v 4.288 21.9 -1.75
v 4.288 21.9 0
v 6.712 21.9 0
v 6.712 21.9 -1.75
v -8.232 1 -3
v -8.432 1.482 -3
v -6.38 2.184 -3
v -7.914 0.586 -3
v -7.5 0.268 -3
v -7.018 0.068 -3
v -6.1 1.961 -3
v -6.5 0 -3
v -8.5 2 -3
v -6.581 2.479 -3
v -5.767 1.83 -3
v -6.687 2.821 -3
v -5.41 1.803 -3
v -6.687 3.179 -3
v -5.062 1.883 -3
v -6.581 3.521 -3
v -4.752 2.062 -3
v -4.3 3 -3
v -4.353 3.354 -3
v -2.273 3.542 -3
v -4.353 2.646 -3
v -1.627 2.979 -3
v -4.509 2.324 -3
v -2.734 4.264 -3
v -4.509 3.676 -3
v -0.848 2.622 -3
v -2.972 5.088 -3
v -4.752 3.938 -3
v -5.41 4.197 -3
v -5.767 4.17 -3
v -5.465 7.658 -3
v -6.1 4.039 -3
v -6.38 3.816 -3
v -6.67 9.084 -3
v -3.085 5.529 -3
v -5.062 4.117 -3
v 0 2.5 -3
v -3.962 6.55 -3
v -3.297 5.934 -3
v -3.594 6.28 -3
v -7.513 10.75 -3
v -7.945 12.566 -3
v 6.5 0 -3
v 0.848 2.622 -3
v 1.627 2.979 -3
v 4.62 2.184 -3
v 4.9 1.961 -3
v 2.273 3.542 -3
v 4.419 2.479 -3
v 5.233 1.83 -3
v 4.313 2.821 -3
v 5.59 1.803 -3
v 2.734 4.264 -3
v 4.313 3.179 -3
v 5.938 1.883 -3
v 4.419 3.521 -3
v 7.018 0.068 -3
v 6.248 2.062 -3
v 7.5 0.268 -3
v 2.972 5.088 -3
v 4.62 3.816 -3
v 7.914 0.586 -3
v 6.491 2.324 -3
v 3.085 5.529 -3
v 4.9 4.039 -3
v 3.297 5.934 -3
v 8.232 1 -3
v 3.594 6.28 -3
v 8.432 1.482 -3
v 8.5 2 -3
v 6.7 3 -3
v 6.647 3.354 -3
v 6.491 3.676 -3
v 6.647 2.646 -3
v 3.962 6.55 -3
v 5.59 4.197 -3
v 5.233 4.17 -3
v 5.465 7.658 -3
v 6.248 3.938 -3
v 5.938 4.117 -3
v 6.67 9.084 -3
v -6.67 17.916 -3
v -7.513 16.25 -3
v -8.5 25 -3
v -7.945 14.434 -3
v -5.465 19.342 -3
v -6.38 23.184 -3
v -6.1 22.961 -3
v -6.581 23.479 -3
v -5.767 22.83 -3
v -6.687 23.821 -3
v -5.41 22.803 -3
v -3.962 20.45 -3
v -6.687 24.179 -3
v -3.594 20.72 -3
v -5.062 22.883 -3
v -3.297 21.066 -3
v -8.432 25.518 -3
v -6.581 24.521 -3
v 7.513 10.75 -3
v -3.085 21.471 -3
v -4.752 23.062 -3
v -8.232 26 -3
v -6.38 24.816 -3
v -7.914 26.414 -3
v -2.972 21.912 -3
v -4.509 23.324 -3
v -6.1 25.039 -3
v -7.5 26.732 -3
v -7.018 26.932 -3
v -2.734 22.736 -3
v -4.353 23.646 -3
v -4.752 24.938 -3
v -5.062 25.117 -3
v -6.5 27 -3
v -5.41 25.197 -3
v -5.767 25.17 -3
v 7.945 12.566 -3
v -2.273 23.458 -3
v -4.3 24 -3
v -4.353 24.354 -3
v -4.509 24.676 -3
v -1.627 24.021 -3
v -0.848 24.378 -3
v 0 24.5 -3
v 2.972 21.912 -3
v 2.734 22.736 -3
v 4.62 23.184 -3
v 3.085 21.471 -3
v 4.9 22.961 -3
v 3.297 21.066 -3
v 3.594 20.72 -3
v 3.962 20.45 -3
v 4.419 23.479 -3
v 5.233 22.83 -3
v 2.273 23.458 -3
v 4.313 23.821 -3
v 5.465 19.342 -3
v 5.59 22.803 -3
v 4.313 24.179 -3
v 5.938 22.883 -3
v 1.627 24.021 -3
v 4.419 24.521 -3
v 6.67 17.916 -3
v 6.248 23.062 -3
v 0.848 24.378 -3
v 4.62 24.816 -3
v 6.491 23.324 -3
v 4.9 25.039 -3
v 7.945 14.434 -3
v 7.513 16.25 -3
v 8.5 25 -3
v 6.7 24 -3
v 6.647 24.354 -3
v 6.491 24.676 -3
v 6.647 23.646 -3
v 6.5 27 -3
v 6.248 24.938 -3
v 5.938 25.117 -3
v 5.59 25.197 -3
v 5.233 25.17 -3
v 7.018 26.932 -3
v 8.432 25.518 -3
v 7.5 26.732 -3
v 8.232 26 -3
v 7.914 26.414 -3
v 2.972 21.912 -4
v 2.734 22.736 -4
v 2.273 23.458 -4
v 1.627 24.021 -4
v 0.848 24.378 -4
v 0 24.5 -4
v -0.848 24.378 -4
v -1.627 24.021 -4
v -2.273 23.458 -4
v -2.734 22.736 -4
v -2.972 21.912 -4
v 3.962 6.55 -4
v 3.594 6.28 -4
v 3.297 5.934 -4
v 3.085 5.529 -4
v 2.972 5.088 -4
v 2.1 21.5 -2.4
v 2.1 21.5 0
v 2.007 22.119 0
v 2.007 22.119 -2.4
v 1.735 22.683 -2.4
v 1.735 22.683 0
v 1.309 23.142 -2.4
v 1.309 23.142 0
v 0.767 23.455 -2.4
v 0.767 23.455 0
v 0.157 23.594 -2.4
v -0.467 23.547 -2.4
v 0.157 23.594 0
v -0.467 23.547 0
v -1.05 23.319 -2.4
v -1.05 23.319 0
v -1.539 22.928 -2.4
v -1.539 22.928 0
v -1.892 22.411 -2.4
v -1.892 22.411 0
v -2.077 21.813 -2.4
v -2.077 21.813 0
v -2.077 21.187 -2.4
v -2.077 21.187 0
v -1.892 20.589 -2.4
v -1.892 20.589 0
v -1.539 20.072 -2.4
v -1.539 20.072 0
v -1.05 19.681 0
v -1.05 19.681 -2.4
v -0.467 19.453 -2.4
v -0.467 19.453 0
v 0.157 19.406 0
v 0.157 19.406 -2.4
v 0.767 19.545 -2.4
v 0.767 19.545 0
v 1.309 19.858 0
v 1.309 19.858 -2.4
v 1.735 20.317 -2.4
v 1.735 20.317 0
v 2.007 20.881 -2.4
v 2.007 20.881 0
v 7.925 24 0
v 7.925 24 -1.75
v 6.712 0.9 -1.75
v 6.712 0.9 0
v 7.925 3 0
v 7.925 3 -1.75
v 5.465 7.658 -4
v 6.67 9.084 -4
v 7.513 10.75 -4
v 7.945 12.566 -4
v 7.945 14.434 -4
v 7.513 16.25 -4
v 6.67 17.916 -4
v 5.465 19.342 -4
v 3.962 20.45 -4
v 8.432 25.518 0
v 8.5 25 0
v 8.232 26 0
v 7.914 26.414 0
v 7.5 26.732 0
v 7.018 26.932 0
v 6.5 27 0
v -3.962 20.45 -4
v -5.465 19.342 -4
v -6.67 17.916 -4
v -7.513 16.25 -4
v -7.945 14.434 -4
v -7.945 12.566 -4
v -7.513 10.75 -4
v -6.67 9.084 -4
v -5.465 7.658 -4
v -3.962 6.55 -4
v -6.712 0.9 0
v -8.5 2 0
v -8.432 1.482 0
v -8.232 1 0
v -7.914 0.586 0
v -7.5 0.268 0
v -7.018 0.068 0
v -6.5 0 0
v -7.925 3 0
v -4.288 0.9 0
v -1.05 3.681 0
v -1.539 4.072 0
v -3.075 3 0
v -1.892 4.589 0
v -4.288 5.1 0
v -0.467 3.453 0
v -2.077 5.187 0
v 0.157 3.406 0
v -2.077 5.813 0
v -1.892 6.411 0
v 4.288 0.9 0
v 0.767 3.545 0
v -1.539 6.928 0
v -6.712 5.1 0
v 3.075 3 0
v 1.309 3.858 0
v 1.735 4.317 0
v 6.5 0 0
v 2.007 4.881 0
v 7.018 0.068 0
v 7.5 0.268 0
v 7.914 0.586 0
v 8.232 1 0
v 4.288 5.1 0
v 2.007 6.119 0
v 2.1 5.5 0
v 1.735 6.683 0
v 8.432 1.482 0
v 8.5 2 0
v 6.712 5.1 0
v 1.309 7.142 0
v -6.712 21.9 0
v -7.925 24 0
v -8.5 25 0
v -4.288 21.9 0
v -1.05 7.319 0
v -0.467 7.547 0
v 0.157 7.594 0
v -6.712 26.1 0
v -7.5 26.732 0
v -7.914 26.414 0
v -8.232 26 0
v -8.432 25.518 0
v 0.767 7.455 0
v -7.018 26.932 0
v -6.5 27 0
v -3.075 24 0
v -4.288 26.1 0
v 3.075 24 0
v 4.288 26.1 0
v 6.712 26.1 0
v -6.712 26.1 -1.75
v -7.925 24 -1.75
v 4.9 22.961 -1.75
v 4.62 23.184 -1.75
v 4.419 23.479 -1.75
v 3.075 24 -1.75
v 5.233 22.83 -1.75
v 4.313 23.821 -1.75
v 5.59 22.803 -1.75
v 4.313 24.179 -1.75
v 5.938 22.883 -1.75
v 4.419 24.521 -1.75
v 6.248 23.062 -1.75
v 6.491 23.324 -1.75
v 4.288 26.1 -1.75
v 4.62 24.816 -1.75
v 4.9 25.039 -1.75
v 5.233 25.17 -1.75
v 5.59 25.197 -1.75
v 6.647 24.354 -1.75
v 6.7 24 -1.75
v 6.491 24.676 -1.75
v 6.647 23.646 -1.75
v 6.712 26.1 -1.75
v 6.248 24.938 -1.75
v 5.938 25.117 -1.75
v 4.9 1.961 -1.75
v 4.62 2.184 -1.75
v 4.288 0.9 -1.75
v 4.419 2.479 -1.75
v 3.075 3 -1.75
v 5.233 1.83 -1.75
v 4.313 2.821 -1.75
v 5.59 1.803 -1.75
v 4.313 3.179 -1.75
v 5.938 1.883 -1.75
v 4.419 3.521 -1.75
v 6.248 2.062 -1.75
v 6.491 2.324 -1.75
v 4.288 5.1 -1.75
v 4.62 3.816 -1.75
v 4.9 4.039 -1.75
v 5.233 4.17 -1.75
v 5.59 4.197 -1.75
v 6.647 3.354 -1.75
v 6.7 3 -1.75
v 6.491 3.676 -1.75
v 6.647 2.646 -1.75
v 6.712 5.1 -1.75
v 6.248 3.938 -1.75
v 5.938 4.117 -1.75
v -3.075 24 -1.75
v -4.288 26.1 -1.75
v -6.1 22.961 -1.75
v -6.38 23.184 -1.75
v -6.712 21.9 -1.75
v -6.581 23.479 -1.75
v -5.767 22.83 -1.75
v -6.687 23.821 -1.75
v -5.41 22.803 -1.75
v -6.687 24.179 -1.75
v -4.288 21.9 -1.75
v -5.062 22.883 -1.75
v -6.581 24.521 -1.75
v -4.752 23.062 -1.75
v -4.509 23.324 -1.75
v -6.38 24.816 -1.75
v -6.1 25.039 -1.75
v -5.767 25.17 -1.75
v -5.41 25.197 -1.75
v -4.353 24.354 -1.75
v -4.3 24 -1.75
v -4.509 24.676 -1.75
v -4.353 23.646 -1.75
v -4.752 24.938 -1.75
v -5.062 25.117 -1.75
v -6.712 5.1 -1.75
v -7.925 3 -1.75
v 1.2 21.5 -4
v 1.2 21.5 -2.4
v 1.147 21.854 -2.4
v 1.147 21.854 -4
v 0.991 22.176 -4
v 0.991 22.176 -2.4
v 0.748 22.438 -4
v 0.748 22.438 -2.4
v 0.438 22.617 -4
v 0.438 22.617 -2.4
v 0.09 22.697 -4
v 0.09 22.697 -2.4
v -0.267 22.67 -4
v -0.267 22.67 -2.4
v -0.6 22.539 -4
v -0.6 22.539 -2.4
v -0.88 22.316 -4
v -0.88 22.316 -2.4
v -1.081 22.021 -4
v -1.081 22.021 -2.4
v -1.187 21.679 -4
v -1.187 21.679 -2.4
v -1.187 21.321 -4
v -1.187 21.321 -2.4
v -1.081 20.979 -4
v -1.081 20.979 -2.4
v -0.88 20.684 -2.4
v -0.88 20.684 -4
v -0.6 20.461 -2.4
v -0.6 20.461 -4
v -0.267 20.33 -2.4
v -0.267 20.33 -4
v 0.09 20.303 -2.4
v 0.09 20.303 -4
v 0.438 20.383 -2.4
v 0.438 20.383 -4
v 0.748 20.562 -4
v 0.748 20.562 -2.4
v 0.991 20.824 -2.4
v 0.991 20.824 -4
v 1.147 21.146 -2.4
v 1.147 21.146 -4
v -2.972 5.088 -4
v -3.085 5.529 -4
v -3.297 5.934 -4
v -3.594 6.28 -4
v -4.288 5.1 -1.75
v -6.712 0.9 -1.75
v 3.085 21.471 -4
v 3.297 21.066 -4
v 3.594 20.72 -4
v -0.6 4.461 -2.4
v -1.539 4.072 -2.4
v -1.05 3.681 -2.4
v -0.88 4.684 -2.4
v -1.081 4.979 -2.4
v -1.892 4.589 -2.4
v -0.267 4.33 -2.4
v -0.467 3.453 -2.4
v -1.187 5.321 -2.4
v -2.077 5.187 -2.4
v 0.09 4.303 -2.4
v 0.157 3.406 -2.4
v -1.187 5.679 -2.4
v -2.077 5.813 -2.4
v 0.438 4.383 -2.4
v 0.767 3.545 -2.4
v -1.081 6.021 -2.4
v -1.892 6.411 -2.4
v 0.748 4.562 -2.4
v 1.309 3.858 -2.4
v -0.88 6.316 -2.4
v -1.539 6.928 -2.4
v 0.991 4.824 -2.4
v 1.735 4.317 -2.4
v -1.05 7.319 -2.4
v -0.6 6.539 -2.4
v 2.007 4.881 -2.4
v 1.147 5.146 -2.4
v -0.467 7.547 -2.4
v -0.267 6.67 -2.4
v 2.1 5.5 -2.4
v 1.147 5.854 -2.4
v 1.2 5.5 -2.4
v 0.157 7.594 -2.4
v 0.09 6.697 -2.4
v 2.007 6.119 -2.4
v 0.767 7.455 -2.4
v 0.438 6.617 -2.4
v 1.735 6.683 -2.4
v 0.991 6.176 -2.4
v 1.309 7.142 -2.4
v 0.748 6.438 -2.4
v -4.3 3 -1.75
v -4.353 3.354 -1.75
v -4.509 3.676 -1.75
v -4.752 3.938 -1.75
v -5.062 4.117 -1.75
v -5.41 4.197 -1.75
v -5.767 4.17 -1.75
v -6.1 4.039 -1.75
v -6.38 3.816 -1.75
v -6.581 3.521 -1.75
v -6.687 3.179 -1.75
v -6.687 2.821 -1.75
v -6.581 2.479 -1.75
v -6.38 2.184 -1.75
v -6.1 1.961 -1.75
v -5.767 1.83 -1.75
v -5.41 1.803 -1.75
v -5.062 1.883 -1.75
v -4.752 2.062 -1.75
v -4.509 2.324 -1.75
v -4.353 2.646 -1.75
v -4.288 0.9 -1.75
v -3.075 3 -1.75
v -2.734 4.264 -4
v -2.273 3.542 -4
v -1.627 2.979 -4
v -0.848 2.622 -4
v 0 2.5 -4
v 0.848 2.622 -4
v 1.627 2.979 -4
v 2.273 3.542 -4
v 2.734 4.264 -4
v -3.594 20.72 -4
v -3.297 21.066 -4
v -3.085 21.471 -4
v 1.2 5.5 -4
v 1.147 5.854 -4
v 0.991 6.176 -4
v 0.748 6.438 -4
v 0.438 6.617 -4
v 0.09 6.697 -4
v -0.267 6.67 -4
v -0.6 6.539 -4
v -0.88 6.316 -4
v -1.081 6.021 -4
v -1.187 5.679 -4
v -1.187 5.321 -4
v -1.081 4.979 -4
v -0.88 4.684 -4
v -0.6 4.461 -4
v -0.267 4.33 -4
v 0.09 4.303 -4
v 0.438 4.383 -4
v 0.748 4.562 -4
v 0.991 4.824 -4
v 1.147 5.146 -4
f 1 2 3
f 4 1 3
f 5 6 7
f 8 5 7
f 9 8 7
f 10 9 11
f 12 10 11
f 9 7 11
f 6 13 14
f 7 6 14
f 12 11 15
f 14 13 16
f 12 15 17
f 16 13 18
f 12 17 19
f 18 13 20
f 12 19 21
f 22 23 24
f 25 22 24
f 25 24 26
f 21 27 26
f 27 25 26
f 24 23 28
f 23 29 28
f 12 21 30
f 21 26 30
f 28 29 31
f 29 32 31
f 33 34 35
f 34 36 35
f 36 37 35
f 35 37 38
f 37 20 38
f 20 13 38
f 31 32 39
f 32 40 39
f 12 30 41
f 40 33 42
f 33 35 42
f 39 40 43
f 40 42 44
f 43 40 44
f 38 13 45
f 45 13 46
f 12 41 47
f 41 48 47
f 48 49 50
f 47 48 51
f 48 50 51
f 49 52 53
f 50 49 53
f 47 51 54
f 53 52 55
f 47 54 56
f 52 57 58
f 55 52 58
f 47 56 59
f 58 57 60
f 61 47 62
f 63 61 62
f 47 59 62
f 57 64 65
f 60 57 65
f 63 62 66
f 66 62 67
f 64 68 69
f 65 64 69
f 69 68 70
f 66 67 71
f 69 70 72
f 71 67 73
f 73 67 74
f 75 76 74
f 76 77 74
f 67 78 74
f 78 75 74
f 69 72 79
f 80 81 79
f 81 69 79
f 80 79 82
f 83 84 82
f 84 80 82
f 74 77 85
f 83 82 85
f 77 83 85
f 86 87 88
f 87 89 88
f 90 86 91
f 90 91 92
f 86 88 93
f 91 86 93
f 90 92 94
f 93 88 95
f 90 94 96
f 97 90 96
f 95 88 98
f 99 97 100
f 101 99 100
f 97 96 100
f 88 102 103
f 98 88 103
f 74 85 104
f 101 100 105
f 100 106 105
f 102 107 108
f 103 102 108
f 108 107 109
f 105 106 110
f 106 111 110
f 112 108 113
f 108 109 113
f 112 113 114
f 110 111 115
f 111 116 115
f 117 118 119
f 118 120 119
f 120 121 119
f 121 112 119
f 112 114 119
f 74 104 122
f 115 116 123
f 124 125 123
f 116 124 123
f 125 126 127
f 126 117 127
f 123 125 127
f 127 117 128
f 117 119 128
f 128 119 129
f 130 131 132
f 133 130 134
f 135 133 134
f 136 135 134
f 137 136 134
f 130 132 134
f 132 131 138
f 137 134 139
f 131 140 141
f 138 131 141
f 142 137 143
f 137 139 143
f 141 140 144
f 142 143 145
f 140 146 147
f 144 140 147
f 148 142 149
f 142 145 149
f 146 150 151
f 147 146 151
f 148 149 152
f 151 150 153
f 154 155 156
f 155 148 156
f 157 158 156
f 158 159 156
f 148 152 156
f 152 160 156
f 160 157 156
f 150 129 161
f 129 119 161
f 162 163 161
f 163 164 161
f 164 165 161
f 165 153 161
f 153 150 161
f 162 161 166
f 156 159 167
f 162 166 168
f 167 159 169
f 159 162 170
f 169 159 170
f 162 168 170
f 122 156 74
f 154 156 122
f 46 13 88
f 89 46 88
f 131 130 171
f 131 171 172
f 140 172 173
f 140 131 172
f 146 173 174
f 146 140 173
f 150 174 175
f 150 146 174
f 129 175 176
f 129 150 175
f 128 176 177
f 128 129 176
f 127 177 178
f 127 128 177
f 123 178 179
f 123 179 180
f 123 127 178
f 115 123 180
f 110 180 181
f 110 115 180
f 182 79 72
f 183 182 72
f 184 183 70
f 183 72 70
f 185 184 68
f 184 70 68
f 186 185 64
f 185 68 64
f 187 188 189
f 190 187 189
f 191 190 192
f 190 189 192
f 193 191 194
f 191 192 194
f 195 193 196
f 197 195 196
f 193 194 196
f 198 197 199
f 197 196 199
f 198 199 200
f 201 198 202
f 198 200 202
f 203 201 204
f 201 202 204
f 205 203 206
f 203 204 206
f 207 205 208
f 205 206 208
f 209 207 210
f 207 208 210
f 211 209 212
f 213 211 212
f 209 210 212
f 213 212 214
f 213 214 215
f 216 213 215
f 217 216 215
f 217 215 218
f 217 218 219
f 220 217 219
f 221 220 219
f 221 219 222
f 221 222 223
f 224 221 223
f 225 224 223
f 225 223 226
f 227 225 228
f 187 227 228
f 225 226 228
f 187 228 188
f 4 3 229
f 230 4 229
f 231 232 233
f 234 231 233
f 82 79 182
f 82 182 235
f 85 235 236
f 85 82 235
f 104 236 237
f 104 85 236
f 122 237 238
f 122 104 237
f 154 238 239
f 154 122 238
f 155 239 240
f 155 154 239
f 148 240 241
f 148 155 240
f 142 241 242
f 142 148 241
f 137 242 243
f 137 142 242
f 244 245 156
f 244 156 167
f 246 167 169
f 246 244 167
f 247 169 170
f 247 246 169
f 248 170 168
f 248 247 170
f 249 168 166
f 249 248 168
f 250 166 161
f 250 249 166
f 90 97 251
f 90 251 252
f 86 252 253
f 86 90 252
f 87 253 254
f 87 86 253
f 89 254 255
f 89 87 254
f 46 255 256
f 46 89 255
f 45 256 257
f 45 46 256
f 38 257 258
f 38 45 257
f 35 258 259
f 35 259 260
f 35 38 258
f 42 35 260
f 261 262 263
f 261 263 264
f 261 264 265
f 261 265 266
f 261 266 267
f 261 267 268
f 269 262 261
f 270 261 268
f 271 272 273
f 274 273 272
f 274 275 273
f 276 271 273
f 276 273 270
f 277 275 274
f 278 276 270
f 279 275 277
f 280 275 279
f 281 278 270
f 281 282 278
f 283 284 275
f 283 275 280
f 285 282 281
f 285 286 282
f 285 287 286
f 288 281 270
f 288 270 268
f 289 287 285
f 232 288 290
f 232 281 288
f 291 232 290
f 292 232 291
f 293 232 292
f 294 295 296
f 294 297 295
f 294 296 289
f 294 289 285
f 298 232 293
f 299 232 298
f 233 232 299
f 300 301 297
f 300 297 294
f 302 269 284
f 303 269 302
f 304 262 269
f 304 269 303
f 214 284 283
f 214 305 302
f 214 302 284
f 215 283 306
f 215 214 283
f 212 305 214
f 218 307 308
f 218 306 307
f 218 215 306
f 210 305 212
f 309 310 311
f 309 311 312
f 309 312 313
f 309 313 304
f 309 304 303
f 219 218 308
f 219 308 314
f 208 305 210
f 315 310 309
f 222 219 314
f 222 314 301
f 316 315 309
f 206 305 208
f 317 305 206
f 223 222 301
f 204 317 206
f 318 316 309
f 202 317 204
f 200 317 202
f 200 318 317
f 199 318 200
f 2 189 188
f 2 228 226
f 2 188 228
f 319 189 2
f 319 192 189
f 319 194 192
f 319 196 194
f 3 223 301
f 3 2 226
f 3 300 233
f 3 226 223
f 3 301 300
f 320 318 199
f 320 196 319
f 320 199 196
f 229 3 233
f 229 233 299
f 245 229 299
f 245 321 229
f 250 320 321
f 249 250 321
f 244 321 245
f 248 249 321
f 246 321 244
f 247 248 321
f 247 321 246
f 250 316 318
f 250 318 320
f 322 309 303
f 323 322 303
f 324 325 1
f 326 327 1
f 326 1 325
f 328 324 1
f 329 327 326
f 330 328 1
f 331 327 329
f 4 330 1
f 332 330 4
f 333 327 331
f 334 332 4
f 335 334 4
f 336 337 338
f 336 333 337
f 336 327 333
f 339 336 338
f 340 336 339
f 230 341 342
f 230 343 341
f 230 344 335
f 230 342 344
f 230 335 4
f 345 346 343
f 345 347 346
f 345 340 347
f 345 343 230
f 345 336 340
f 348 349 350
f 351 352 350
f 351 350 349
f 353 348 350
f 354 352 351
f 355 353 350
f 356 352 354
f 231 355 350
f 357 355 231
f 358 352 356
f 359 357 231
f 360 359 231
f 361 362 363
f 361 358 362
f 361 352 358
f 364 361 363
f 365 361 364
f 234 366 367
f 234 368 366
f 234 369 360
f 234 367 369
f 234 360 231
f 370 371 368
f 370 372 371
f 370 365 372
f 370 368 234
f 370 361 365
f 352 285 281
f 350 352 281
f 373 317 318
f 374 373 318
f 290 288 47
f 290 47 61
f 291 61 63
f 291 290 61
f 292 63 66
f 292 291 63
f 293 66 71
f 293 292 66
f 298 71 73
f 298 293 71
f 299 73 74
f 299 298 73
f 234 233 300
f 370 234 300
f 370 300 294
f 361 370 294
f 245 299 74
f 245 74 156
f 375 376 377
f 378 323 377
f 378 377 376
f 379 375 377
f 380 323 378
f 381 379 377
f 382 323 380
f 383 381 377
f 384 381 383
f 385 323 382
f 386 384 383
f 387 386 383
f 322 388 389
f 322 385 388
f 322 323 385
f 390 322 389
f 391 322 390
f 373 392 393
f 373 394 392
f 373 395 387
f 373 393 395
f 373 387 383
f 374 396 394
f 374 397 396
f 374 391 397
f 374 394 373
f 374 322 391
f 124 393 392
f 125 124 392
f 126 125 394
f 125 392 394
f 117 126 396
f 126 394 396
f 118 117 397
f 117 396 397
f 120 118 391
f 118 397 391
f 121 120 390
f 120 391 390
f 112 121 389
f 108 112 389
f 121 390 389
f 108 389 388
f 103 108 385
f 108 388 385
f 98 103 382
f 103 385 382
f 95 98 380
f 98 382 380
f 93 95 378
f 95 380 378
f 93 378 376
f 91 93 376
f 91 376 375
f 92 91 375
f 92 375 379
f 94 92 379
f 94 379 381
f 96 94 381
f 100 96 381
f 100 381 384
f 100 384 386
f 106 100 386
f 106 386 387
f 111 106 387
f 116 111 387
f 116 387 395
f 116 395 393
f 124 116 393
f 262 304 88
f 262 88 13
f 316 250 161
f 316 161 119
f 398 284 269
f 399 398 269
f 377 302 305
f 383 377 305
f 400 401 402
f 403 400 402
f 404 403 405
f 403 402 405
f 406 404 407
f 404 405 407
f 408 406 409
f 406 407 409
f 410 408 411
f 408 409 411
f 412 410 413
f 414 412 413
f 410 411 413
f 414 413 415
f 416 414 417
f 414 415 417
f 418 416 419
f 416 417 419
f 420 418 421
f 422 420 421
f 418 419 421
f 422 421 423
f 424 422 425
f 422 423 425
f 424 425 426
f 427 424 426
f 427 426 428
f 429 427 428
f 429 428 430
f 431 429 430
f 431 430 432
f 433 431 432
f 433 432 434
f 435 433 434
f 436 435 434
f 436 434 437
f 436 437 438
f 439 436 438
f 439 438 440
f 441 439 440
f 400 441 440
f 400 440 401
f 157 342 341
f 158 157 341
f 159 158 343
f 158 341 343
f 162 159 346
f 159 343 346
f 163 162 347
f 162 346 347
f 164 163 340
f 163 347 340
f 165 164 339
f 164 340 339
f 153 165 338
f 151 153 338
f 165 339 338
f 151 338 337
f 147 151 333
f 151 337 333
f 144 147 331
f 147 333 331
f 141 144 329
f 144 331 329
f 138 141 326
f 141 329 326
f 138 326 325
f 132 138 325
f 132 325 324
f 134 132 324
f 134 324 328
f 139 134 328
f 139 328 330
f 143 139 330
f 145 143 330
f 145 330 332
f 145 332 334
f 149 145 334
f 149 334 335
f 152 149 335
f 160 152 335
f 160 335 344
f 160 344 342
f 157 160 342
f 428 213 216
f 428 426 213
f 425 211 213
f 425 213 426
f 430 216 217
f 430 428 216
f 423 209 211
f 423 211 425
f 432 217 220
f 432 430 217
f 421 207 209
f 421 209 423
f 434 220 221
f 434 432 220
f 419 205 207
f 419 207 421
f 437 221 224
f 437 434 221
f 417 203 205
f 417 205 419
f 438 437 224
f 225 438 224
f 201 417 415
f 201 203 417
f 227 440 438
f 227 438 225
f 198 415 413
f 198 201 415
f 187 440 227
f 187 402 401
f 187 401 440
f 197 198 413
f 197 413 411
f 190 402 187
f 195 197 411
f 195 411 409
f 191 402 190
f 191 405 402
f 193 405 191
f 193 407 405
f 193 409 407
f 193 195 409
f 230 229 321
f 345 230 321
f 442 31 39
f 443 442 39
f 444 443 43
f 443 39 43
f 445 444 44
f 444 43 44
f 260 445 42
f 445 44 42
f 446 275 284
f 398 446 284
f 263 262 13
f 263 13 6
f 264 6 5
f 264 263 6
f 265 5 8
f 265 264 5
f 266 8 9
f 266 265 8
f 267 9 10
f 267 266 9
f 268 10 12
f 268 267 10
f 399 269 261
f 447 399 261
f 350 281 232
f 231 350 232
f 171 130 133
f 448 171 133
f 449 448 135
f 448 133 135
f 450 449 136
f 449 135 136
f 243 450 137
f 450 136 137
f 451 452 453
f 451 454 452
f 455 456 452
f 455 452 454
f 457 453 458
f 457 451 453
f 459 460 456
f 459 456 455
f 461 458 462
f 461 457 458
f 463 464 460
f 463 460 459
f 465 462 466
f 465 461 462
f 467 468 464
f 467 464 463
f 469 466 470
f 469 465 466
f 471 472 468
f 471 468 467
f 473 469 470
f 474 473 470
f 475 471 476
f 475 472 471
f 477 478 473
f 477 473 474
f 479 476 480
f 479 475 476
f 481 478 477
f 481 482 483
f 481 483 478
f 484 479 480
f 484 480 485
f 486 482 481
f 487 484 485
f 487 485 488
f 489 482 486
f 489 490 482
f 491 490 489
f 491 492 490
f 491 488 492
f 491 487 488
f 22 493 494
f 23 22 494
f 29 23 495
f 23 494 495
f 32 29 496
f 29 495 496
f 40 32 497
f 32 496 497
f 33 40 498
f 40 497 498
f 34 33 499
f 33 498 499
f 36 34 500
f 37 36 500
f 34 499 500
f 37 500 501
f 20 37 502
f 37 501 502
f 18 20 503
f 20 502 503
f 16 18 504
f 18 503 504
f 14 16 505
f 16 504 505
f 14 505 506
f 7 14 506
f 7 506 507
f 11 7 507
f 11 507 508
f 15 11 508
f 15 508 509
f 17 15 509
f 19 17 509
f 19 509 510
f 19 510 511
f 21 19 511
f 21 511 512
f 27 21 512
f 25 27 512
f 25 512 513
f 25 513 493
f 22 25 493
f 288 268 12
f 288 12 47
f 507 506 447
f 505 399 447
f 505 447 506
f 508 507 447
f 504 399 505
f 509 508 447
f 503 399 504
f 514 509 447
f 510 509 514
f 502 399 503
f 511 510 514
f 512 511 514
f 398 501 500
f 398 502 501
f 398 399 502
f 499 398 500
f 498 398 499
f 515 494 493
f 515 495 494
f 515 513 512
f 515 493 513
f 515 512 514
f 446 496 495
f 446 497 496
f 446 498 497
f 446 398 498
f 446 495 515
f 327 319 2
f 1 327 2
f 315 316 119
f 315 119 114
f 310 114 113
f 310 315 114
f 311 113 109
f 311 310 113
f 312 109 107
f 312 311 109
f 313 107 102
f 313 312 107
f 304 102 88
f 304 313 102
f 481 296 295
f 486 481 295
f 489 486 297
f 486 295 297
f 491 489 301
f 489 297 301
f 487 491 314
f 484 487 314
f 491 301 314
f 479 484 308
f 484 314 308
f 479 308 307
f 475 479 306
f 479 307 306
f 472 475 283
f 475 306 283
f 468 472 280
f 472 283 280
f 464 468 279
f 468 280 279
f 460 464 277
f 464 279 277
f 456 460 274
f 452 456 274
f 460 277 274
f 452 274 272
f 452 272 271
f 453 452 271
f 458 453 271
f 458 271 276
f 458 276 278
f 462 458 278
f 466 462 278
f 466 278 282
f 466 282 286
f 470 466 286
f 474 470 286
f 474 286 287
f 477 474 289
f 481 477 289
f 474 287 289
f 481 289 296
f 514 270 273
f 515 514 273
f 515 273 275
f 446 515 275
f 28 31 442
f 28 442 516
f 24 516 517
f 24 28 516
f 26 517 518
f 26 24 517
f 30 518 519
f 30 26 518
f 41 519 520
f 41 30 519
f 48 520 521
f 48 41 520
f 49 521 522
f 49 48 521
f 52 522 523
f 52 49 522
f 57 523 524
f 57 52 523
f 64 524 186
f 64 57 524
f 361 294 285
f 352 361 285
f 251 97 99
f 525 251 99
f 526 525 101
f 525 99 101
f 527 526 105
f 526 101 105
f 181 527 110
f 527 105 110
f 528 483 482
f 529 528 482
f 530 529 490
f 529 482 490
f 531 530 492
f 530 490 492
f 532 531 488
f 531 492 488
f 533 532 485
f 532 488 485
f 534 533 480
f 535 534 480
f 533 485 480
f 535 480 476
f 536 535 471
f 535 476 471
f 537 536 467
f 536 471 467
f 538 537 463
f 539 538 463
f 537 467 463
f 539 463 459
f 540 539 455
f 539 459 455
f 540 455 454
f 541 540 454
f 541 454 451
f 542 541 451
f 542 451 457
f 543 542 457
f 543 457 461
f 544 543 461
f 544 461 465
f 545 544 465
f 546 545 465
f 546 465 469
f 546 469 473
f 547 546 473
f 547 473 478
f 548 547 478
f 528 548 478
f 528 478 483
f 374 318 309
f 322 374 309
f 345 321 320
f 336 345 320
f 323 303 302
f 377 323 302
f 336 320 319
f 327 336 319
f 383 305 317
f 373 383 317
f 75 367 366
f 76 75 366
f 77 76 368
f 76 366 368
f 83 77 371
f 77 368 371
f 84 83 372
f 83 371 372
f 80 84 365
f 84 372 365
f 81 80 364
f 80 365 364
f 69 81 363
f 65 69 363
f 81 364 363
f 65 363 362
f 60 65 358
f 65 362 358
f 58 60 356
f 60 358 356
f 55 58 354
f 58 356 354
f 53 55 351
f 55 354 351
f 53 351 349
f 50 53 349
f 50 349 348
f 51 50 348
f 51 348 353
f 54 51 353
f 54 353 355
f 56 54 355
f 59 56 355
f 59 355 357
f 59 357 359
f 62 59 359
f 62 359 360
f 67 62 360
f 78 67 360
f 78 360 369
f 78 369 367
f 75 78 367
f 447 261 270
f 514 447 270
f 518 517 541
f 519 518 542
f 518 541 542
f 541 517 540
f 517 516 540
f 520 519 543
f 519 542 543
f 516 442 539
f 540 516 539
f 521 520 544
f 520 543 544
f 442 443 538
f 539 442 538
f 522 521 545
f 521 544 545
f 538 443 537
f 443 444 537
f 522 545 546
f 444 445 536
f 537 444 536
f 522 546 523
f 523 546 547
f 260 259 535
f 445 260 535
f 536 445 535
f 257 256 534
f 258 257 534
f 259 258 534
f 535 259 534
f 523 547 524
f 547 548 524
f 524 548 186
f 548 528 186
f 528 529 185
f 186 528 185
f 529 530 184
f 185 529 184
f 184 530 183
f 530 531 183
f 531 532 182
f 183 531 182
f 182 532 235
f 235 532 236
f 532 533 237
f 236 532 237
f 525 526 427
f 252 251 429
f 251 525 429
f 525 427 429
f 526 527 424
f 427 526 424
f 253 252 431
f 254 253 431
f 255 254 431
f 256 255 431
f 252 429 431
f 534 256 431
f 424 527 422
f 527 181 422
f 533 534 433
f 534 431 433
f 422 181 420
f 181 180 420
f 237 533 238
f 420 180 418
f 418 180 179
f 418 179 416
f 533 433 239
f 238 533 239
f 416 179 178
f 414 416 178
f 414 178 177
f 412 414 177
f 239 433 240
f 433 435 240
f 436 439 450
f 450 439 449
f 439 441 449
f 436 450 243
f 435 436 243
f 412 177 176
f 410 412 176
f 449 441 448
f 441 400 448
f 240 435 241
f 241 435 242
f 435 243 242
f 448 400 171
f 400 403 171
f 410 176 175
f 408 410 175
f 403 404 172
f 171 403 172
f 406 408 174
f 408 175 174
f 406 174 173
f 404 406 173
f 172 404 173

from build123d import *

# Parameters (mm, degrees)
PAD004_DEPTH         = 3
SKETCH049_R          = 1.2
POCKET025_DEPTH      = 3.001
PAD003_DEPTH         = 1
SKETCH048_R          = 1.2
POCKET023_DEPTH      = 4.001
POCKET023_DEPTH_BACK = 0.001
POCKET024_DEPTH      = 1.75
SKETCH052_R          = 2.1
POCKET026_DEPTH      = 2.4


with BuildPart() as part:
    # Sketch047 → Pad004 (new body)
    with BuildSketch(Plane.XY):
        with BuildLine():
            Line((-6.5, 0), (6.5, 0))
            ThreePointArc((6.5, 0), (7.914214, 0.585786), (8.5, 2))
            Line((8.5, 2), (8.5, 25))
            ThreePointArc((8.5, 25), (7.914214, 26.414214), (6.5, 27))
            Line((6.5, 27), (-6.5, 27))
            ThreePointArc((-6.5, 27), (-7.914214, 26.414214), (-8.5, 25))
            Line((-8.5, 25), (-8.5, 2))
            ThreePointArc((-8.5, 2), (-7.914214, 0.585786), (-6.5, 0))
        make_face()
    extrude(amount=-PAD004_DEPTH)

    # Sketch049 → Pocket025 (cut, through all)
    with BuildSketch(Plane.XY):
        with Locations((-5.5, 24)):
            Circle(SKETCH049_R)
        with Locations((5.5, 24)):
            Circle(SKETCH049_R)
        with Locations((5.5, 3)):
            Circle(SKETCH049_R)
        with Locations((-5.5, 3)):
            Circle(SKETCH049_R)
    extrude(amount=-POCKET025_DEPTH, mode=Mode.SUBTRACT)

    # Sketch051 (on DatumPlane) → Pad003 (join)
    with BuildSketch(Plane.XY.offset(-3)):
        with BuildLine():
            ThreePointArc((-3.962007, 20.45), (-8, 13.5), (-3.962007, 6.55))
            ThreePointArc((-2.971505, 5.0875), (-3.296554, 5.934022), (-3.962007, 6.55))
            ThreePointArc((-2.971505, 5.0875), (0, 2.5), (2.971505, 5.0875))
            ThreePointArc((3.962007, 6.55), (3.296554, 5.934022), (2.971505, 5.0875))
            ThreePointArc((3.962007, 6.55), (8, 13.5), (3.962007, 20.45))
            ThreePointArc((2.971505, 21.9125), (3.296554, 21.065978), (3.962007, 20.45))
            ThreePointArc((2.971505, 21.9125), (0, 24.5), (-2.971505, 21.9125))
            ThreePointArc((-3.962007, 20.45), (-3.296554, 21.065978), (-2.971505, 21.9125))
        make_face()
    extrude(amount=-PAD003_DEPTH)

    # Sketch048 → Pocket023 (cut, two sides)
    with BuildSketch(Plane.XY) as pocket023_sk:
        with Locations((0, 5.5)):
            Circle(SKETCH048_R)
        with Locations((0, 21.5)):
            Circle(SKETCH048_R)
    extrude(amount=-POCKET023_DEPTH, mode=Mode.SUBTRACT)
    extrude(pocket023_sk.sketch, amount=POCKET023_DEPTH_BACK, mode=Mode.SUBTRACT)

    # Sketch050 → Pocket024 (cut)
    with BuildSketch(Plane.XY):
        Polygon((4.287564, 0.9), (6.712436, 0.9), (7.924871, 3), (6.712436, 5.1), (4.287564, 5.1), (3.075129, 3), align=None)
        Polygon((6.712436, 26.1), (4.287564, 26.1), (3.075129, 24), (4.287564, 21.9), (6.712436, 21.9), (7.924871, 24), align=None)
        Polygon((-4.287564, 21.9), (-3.075129, 24), (-4.287564, 26.1), (-6.712436, 26.1), (-7.924871, 24), (-6.712436, 21.9), align=None)
        Polygon((-4.287564, 0.9), (-3.075129, 3), (-4.287564, 5.1), (-6.712436, 5.1), (-7.924871, 3), (-6.712436, 0.9), align=None)
    extrude(amount=-POCKET024_DEPTH, mode=Mode.SUBTRACT)

    # Sketch052 → Pocket026 (cut)
    with BuildSketch(Plane.XY):
        with Locations((0, 21.5)):
            Circle(SKETCH052_R)
        with Locations((0, 5.5)):
            Circle(SKETCH052_R)
    extrude(amount=-POCKET026_DEPTH, mode=Mode.SUBTRACT)


solid = part.part
